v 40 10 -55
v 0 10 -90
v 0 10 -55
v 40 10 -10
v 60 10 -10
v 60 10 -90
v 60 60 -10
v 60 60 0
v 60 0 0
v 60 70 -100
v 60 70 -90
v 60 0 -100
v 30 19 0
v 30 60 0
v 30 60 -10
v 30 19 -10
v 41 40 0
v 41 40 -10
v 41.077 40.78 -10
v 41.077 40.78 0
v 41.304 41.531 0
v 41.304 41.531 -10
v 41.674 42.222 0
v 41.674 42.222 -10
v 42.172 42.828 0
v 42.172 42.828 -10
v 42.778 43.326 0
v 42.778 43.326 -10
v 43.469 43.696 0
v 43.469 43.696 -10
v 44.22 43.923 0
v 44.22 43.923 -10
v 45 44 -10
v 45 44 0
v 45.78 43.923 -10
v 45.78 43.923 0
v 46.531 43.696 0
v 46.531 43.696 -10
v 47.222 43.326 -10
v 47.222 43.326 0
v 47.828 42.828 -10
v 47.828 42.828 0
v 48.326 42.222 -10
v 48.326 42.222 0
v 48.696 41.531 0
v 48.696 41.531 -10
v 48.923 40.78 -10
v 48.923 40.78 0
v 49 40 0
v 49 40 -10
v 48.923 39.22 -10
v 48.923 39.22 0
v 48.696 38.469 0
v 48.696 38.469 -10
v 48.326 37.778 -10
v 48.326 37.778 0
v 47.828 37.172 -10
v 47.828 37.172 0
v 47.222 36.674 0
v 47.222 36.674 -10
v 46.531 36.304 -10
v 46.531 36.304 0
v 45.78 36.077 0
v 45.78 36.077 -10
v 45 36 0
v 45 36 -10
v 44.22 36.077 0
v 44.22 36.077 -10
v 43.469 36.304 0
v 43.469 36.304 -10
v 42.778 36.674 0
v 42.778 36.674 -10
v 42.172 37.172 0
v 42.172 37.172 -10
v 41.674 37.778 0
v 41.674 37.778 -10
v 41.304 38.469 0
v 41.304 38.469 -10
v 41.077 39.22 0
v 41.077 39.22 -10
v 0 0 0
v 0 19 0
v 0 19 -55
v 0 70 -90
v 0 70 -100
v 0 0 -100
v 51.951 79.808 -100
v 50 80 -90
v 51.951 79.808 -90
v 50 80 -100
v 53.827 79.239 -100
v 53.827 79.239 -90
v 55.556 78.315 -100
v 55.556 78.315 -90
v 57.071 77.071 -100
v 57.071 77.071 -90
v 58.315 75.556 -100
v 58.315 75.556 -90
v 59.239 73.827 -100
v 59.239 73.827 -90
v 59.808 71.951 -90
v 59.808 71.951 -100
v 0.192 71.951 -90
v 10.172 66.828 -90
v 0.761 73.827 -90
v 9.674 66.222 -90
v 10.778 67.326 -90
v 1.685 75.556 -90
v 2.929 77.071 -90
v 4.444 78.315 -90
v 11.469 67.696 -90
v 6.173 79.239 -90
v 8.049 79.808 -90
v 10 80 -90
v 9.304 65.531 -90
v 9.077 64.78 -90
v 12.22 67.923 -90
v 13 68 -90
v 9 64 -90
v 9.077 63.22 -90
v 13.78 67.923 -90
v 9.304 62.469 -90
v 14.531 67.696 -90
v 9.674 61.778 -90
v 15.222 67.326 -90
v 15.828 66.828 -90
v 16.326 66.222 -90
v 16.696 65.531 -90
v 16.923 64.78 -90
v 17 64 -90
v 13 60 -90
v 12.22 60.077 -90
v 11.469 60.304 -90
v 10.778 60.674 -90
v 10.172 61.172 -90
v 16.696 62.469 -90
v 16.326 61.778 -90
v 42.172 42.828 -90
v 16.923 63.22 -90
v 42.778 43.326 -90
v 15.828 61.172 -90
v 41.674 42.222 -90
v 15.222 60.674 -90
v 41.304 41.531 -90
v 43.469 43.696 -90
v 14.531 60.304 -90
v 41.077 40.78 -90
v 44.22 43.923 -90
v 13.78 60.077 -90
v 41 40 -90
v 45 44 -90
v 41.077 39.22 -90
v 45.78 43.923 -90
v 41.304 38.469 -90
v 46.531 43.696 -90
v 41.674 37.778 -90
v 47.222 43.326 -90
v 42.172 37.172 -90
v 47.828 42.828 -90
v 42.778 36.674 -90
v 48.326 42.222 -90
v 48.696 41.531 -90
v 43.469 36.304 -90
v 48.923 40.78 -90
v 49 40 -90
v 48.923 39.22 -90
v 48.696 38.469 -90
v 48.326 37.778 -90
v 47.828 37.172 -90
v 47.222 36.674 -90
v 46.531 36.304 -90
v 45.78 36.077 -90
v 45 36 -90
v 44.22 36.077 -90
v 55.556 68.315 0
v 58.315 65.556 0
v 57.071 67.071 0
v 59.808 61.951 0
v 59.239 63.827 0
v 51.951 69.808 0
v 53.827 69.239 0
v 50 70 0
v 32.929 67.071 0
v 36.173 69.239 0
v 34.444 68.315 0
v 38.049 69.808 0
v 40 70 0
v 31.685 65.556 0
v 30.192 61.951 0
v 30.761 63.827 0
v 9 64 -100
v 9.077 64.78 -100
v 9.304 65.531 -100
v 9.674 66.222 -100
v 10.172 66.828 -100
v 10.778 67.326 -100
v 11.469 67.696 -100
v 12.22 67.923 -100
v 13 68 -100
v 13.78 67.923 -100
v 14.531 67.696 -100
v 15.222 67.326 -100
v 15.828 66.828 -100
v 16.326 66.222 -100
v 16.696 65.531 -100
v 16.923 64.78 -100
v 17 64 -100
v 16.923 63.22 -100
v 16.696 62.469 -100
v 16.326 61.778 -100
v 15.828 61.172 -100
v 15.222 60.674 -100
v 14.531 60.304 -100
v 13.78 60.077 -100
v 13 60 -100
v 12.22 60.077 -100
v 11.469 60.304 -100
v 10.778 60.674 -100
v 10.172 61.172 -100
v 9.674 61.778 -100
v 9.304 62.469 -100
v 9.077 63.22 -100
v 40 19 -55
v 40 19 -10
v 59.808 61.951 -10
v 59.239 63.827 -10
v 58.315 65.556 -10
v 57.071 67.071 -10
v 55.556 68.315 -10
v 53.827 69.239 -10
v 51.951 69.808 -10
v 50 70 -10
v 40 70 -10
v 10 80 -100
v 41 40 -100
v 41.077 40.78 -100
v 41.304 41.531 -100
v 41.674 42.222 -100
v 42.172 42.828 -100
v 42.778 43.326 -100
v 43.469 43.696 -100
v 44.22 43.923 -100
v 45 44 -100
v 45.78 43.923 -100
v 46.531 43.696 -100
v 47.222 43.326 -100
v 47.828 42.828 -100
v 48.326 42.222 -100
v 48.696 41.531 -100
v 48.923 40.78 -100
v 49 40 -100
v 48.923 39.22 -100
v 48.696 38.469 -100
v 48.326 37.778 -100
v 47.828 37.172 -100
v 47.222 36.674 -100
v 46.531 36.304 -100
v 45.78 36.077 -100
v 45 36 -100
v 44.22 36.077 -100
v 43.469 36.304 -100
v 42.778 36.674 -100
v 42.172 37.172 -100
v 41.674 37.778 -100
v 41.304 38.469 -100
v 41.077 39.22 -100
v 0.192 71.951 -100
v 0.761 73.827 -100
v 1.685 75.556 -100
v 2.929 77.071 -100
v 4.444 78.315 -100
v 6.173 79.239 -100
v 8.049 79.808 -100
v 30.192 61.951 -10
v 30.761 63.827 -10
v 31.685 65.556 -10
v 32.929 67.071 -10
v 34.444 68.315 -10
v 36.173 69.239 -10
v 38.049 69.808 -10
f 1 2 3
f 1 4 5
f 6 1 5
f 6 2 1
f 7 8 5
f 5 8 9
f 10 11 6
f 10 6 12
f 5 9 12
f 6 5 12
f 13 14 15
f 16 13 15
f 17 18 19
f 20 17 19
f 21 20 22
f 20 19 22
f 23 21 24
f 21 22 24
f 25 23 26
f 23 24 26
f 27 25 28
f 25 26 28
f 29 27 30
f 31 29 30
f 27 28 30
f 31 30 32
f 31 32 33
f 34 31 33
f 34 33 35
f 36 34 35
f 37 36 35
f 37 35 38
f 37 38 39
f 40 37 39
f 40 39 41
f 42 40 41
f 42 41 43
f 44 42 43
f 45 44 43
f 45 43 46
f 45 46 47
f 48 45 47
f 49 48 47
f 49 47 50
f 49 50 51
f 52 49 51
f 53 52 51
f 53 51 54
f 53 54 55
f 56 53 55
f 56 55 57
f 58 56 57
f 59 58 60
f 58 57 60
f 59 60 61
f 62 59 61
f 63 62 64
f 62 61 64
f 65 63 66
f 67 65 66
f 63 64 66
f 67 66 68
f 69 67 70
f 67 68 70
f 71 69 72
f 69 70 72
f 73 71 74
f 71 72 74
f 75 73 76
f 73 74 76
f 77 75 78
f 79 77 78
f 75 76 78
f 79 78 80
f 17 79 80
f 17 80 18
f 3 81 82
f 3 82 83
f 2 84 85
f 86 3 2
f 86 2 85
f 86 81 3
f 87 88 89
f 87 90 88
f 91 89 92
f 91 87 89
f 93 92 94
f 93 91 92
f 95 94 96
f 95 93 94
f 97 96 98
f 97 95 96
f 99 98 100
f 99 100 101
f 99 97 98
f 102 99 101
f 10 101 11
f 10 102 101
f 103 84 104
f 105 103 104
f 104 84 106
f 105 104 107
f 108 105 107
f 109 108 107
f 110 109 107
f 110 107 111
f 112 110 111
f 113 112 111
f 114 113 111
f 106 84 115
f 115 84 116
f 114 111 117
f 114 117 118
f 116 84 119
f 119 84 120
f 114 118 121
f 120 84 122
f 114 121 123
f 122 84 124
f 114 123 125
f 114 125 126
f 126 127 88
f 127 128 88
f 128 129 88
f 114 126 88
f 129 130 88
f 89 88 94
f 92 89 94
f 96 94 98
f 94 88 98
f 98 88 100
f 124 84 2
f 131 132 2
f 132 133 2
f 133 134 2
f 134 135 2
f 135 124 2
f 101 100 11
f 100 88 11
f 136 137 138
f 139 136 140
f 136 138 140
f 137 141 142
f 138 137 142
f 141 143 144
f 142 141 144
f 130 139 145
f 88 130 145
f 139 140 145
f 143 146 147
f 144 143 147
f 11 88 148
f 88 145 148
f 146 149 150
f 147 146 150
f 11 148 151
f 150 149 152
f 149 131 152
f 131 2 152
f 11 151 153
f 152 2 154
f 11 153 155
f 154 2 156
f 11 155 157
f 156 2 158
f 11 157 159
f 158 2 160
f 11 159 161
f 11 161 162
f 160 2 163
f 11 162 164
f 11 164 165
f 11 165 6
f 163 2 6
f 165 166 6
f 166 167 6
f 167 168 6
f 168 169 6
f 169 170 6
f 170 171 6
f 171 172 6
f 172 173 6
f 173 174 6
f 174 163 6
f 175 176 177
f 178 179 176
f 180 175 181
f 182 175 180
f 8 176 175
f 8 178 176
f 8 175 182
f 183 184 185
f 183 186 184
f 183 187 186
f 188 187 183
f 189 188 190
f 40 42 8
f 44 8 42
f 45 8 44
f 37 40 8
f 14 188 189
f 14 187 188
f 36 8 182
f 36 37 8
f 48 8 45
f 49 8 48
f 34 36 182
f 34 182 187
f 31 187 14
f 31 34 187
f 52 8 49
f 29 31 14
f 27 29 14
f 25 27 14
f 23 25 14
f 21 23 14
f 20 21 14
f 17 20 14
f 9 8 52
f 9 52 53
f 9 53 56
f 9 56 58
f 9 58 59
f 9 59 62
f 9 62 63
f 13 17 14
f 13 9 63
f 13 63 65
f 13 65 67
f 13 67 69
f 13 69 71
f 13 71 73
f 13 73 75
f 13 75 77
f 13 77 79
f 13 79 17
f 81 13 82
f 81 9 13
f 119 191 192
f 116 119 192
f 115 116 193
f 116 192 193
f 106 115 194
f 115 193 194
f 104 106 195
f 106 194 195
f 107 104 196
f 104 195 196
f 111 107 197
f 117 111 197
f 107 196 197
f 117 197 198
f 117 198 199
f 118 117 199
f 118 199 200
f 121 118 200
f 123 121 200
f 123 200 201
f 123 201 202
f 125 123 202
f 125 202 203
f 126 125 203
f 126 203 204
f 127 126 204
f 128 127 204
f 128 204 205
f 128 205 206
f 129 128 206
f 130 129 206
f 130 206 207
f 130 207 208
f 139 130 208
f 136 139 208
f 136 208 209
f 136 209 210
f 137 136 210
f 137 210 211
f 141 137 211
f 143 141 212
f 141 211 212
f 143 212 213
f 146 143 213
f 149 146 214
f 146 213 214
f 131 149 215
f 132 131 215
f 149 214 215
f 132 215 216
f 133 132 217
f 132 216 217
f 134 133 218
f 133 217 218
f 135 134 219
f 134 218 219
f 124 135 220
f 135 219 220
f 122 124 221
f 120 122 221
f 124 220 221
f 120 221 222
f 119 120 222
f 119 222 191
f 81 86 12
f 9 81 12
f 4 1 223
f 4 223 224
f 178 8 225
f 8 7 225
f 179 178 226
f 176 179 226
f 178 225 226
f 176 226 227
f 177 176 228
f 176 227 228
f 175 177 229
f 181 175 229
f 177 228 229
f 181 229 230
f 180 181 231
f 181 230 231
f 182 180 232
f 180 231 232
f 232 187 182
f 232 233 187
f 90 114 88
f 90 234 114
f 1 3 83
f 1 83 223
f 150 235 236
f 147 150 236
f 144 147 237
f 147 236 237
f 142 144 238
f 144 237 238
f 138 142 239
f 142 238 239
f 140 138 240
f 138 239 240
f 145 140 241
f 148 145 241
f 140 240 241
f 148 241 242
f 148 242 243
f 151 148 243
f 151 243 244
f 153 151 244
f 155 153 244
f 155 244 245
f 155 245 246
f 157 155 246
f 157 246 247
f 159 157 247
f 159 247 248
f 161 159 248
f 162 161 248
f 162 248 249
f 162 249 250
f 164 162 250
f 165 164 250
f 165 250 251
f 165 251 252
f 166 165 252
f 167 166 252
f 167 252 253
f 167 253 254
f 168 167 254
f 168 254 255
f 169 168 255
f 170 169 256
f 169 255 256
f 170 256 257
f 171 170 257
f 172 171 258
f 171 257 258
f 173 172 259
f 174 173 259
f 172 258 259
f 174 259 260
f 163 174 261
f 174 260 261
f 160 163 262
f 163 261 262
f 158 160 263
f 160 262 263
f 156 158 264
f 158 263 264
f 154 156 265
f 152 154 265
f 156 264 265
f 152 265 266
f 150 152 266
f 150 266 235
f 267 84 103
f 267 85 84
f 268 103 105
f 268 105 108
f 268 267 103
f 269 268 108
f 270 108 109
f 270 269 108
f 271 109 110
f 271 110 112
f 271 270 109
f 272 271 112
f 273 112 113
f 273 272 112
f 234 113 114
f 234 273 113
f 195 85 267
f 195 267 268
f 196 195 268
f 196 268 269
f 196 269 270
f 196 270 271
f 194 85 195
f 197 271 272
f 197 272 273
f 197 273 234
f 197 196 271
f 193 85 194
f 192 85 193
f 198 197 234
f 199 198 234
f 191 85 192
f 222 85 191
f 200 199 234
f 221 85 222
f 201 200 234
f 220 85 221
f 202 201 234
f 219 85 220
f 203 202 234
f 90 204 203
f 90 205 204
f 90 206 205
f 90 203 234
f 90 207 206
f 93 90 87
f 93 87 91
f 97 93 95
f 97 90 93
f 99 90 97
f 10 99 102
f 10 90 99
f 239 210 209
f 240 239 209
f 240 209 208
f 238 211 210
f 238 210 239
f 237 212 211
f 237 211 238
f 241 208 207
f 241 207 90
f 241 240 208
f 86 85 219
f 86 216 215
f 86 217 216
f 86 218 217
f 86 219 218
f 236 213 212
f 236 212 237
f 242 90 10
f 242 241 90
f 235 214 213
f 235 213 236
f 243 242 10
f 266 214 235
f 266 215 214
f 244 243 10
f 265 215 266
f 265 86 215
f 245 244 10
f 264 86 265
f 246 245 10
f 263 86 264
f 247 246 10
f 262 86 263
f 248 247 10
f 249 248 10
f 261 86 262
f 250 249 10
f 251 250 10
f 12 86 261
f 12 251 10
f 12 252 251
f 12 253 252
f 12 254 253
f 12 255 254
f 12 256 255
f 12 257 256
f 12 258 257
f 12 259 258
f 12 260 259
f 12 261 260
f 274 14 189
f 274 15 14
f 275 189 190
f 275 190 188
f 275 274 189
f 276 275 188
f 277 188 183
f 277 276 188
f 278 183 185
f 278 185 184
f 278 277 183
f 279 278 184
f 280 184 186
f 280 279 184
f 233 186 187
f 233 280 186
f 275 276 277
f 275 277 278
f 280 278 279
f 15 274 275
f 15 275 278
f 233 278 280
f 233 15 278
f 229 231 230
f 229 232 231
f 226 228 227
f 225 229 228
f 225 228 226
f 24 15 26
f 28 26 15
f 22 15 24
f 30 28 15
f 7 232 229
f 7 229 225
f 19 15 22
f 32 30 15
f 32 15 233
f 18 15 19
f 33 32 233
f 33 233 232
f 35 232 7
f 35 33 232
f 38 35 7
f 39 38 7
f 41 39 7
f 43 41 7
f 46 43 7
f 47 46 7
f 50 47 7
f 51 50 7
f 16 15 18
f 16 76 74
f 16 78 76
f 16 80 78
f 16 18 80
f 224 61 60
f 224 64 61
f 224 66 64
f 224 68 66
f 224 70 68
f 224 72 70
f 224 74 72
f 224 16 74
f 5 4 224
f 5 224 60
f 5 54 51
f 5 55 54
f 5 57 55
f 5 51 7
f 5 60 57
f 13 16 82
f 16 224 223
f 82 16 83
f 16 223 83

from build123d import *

# Parameters (mm, degrees)
ESQUISSE1_W             = 60
ESQUISSE1_H             = 100
BOSS_EXTRU_1_DEPTH      = 10
ESQUISSE2_W             = 30
ESQUISSE2_H             = 10
BOSS_EXTRU_2_DEPTH      = 60
ESQUISSE3_W             = 60
ESQUISSE3_H             = 10
BOSS_EXTRU_3_DEPTH      = 70
BOSS_EXTRU_4_DEPTH      = 9
ESQUISSE6_R             = 4
ENL_V_MAT_EXTRU_2_DEPTH = 142.421356237
CONG_1_R                = 10


with BuildPart() as part:
    # Esquisse1 → Boss.-Extru.1 (new body)
    with BuildSketch(Plane(origin=(0, 0, 0), x_dir=(1, 0, 0), z_dir=(0, 1, 0))):
        with Locations((30, 50)):
            Rectangle(ESQUISSE1_W, ESQUISSE1_H)
    extrude(amount=BOSS_EXTRU_1_DEPTH)

    # Esquisse2 → Boss.-Extru.2 (add)
    with BuildSketch(Plane(origin=(0, 10, 0), x_dir=(1, 0, 0), z_dir=(0, 1, 0))):
        with Locations((45, 5)):
            Rectangle(ESQUISSE2_W, ESQUISSE2_H)
    extrude(amount=BOSS_EXTRU_2_DEPTH)

    # Esquisse3 → Boss.-Extru.3 (add)
    with BuildSketch(Plane(origin=(0, 10, 0), x_dir=(1, 0, 0), z_dir=(0, 1, 0))):
        with Locations((30, 95)):
            Rectangle(ESQUISSE3_W, ESQUISSE3_H)
    extrude(amount=BOSS_EXTRU_3_DEPTH)

    # Esquisse8 → Boss.-Extru.4 (add)
    with BuildSketch(Plane(origin=(0, 10, 0), x_dir=(1, 0, 0), z_dir=(0, 1, 0))):
        Polygon((0, 0), (0, 55), (40, 55), (40, 10), (30, 10), (30, 0), align=None)
    extrude(amount=BOSS_EXTRU_4_DEPTH)

    # Esquisse6 → Enlèv. mat.-Extru.2 (cut, through all)
    with BuildSketch(Plane(origin=(0, 0, -100), x_dir=(-1, 0, 0), z_dir=(0, 0, -1))):
        with Locations((-45, 40)):
            Circle(ESQUISSE6_R)
        with Locations((-13, 64)):
            Circle(ESQUISSE6_R)
    extrude(amount=-ENL_V_MAT_EXTRU_2_DEPTH, mode=Mode.SUBTRACT)

    # Congé1
    cong_1_edges = [part.edges().sort_by_distance(p)[0] for p in [
        (0, 80, -95),
        (60, 80, -95),
        (30, 70, -5),
        (60, 70, -5),
    ]]
    fillet(cong_1_edges, radius=CONG_1_R)


solid = part.part
